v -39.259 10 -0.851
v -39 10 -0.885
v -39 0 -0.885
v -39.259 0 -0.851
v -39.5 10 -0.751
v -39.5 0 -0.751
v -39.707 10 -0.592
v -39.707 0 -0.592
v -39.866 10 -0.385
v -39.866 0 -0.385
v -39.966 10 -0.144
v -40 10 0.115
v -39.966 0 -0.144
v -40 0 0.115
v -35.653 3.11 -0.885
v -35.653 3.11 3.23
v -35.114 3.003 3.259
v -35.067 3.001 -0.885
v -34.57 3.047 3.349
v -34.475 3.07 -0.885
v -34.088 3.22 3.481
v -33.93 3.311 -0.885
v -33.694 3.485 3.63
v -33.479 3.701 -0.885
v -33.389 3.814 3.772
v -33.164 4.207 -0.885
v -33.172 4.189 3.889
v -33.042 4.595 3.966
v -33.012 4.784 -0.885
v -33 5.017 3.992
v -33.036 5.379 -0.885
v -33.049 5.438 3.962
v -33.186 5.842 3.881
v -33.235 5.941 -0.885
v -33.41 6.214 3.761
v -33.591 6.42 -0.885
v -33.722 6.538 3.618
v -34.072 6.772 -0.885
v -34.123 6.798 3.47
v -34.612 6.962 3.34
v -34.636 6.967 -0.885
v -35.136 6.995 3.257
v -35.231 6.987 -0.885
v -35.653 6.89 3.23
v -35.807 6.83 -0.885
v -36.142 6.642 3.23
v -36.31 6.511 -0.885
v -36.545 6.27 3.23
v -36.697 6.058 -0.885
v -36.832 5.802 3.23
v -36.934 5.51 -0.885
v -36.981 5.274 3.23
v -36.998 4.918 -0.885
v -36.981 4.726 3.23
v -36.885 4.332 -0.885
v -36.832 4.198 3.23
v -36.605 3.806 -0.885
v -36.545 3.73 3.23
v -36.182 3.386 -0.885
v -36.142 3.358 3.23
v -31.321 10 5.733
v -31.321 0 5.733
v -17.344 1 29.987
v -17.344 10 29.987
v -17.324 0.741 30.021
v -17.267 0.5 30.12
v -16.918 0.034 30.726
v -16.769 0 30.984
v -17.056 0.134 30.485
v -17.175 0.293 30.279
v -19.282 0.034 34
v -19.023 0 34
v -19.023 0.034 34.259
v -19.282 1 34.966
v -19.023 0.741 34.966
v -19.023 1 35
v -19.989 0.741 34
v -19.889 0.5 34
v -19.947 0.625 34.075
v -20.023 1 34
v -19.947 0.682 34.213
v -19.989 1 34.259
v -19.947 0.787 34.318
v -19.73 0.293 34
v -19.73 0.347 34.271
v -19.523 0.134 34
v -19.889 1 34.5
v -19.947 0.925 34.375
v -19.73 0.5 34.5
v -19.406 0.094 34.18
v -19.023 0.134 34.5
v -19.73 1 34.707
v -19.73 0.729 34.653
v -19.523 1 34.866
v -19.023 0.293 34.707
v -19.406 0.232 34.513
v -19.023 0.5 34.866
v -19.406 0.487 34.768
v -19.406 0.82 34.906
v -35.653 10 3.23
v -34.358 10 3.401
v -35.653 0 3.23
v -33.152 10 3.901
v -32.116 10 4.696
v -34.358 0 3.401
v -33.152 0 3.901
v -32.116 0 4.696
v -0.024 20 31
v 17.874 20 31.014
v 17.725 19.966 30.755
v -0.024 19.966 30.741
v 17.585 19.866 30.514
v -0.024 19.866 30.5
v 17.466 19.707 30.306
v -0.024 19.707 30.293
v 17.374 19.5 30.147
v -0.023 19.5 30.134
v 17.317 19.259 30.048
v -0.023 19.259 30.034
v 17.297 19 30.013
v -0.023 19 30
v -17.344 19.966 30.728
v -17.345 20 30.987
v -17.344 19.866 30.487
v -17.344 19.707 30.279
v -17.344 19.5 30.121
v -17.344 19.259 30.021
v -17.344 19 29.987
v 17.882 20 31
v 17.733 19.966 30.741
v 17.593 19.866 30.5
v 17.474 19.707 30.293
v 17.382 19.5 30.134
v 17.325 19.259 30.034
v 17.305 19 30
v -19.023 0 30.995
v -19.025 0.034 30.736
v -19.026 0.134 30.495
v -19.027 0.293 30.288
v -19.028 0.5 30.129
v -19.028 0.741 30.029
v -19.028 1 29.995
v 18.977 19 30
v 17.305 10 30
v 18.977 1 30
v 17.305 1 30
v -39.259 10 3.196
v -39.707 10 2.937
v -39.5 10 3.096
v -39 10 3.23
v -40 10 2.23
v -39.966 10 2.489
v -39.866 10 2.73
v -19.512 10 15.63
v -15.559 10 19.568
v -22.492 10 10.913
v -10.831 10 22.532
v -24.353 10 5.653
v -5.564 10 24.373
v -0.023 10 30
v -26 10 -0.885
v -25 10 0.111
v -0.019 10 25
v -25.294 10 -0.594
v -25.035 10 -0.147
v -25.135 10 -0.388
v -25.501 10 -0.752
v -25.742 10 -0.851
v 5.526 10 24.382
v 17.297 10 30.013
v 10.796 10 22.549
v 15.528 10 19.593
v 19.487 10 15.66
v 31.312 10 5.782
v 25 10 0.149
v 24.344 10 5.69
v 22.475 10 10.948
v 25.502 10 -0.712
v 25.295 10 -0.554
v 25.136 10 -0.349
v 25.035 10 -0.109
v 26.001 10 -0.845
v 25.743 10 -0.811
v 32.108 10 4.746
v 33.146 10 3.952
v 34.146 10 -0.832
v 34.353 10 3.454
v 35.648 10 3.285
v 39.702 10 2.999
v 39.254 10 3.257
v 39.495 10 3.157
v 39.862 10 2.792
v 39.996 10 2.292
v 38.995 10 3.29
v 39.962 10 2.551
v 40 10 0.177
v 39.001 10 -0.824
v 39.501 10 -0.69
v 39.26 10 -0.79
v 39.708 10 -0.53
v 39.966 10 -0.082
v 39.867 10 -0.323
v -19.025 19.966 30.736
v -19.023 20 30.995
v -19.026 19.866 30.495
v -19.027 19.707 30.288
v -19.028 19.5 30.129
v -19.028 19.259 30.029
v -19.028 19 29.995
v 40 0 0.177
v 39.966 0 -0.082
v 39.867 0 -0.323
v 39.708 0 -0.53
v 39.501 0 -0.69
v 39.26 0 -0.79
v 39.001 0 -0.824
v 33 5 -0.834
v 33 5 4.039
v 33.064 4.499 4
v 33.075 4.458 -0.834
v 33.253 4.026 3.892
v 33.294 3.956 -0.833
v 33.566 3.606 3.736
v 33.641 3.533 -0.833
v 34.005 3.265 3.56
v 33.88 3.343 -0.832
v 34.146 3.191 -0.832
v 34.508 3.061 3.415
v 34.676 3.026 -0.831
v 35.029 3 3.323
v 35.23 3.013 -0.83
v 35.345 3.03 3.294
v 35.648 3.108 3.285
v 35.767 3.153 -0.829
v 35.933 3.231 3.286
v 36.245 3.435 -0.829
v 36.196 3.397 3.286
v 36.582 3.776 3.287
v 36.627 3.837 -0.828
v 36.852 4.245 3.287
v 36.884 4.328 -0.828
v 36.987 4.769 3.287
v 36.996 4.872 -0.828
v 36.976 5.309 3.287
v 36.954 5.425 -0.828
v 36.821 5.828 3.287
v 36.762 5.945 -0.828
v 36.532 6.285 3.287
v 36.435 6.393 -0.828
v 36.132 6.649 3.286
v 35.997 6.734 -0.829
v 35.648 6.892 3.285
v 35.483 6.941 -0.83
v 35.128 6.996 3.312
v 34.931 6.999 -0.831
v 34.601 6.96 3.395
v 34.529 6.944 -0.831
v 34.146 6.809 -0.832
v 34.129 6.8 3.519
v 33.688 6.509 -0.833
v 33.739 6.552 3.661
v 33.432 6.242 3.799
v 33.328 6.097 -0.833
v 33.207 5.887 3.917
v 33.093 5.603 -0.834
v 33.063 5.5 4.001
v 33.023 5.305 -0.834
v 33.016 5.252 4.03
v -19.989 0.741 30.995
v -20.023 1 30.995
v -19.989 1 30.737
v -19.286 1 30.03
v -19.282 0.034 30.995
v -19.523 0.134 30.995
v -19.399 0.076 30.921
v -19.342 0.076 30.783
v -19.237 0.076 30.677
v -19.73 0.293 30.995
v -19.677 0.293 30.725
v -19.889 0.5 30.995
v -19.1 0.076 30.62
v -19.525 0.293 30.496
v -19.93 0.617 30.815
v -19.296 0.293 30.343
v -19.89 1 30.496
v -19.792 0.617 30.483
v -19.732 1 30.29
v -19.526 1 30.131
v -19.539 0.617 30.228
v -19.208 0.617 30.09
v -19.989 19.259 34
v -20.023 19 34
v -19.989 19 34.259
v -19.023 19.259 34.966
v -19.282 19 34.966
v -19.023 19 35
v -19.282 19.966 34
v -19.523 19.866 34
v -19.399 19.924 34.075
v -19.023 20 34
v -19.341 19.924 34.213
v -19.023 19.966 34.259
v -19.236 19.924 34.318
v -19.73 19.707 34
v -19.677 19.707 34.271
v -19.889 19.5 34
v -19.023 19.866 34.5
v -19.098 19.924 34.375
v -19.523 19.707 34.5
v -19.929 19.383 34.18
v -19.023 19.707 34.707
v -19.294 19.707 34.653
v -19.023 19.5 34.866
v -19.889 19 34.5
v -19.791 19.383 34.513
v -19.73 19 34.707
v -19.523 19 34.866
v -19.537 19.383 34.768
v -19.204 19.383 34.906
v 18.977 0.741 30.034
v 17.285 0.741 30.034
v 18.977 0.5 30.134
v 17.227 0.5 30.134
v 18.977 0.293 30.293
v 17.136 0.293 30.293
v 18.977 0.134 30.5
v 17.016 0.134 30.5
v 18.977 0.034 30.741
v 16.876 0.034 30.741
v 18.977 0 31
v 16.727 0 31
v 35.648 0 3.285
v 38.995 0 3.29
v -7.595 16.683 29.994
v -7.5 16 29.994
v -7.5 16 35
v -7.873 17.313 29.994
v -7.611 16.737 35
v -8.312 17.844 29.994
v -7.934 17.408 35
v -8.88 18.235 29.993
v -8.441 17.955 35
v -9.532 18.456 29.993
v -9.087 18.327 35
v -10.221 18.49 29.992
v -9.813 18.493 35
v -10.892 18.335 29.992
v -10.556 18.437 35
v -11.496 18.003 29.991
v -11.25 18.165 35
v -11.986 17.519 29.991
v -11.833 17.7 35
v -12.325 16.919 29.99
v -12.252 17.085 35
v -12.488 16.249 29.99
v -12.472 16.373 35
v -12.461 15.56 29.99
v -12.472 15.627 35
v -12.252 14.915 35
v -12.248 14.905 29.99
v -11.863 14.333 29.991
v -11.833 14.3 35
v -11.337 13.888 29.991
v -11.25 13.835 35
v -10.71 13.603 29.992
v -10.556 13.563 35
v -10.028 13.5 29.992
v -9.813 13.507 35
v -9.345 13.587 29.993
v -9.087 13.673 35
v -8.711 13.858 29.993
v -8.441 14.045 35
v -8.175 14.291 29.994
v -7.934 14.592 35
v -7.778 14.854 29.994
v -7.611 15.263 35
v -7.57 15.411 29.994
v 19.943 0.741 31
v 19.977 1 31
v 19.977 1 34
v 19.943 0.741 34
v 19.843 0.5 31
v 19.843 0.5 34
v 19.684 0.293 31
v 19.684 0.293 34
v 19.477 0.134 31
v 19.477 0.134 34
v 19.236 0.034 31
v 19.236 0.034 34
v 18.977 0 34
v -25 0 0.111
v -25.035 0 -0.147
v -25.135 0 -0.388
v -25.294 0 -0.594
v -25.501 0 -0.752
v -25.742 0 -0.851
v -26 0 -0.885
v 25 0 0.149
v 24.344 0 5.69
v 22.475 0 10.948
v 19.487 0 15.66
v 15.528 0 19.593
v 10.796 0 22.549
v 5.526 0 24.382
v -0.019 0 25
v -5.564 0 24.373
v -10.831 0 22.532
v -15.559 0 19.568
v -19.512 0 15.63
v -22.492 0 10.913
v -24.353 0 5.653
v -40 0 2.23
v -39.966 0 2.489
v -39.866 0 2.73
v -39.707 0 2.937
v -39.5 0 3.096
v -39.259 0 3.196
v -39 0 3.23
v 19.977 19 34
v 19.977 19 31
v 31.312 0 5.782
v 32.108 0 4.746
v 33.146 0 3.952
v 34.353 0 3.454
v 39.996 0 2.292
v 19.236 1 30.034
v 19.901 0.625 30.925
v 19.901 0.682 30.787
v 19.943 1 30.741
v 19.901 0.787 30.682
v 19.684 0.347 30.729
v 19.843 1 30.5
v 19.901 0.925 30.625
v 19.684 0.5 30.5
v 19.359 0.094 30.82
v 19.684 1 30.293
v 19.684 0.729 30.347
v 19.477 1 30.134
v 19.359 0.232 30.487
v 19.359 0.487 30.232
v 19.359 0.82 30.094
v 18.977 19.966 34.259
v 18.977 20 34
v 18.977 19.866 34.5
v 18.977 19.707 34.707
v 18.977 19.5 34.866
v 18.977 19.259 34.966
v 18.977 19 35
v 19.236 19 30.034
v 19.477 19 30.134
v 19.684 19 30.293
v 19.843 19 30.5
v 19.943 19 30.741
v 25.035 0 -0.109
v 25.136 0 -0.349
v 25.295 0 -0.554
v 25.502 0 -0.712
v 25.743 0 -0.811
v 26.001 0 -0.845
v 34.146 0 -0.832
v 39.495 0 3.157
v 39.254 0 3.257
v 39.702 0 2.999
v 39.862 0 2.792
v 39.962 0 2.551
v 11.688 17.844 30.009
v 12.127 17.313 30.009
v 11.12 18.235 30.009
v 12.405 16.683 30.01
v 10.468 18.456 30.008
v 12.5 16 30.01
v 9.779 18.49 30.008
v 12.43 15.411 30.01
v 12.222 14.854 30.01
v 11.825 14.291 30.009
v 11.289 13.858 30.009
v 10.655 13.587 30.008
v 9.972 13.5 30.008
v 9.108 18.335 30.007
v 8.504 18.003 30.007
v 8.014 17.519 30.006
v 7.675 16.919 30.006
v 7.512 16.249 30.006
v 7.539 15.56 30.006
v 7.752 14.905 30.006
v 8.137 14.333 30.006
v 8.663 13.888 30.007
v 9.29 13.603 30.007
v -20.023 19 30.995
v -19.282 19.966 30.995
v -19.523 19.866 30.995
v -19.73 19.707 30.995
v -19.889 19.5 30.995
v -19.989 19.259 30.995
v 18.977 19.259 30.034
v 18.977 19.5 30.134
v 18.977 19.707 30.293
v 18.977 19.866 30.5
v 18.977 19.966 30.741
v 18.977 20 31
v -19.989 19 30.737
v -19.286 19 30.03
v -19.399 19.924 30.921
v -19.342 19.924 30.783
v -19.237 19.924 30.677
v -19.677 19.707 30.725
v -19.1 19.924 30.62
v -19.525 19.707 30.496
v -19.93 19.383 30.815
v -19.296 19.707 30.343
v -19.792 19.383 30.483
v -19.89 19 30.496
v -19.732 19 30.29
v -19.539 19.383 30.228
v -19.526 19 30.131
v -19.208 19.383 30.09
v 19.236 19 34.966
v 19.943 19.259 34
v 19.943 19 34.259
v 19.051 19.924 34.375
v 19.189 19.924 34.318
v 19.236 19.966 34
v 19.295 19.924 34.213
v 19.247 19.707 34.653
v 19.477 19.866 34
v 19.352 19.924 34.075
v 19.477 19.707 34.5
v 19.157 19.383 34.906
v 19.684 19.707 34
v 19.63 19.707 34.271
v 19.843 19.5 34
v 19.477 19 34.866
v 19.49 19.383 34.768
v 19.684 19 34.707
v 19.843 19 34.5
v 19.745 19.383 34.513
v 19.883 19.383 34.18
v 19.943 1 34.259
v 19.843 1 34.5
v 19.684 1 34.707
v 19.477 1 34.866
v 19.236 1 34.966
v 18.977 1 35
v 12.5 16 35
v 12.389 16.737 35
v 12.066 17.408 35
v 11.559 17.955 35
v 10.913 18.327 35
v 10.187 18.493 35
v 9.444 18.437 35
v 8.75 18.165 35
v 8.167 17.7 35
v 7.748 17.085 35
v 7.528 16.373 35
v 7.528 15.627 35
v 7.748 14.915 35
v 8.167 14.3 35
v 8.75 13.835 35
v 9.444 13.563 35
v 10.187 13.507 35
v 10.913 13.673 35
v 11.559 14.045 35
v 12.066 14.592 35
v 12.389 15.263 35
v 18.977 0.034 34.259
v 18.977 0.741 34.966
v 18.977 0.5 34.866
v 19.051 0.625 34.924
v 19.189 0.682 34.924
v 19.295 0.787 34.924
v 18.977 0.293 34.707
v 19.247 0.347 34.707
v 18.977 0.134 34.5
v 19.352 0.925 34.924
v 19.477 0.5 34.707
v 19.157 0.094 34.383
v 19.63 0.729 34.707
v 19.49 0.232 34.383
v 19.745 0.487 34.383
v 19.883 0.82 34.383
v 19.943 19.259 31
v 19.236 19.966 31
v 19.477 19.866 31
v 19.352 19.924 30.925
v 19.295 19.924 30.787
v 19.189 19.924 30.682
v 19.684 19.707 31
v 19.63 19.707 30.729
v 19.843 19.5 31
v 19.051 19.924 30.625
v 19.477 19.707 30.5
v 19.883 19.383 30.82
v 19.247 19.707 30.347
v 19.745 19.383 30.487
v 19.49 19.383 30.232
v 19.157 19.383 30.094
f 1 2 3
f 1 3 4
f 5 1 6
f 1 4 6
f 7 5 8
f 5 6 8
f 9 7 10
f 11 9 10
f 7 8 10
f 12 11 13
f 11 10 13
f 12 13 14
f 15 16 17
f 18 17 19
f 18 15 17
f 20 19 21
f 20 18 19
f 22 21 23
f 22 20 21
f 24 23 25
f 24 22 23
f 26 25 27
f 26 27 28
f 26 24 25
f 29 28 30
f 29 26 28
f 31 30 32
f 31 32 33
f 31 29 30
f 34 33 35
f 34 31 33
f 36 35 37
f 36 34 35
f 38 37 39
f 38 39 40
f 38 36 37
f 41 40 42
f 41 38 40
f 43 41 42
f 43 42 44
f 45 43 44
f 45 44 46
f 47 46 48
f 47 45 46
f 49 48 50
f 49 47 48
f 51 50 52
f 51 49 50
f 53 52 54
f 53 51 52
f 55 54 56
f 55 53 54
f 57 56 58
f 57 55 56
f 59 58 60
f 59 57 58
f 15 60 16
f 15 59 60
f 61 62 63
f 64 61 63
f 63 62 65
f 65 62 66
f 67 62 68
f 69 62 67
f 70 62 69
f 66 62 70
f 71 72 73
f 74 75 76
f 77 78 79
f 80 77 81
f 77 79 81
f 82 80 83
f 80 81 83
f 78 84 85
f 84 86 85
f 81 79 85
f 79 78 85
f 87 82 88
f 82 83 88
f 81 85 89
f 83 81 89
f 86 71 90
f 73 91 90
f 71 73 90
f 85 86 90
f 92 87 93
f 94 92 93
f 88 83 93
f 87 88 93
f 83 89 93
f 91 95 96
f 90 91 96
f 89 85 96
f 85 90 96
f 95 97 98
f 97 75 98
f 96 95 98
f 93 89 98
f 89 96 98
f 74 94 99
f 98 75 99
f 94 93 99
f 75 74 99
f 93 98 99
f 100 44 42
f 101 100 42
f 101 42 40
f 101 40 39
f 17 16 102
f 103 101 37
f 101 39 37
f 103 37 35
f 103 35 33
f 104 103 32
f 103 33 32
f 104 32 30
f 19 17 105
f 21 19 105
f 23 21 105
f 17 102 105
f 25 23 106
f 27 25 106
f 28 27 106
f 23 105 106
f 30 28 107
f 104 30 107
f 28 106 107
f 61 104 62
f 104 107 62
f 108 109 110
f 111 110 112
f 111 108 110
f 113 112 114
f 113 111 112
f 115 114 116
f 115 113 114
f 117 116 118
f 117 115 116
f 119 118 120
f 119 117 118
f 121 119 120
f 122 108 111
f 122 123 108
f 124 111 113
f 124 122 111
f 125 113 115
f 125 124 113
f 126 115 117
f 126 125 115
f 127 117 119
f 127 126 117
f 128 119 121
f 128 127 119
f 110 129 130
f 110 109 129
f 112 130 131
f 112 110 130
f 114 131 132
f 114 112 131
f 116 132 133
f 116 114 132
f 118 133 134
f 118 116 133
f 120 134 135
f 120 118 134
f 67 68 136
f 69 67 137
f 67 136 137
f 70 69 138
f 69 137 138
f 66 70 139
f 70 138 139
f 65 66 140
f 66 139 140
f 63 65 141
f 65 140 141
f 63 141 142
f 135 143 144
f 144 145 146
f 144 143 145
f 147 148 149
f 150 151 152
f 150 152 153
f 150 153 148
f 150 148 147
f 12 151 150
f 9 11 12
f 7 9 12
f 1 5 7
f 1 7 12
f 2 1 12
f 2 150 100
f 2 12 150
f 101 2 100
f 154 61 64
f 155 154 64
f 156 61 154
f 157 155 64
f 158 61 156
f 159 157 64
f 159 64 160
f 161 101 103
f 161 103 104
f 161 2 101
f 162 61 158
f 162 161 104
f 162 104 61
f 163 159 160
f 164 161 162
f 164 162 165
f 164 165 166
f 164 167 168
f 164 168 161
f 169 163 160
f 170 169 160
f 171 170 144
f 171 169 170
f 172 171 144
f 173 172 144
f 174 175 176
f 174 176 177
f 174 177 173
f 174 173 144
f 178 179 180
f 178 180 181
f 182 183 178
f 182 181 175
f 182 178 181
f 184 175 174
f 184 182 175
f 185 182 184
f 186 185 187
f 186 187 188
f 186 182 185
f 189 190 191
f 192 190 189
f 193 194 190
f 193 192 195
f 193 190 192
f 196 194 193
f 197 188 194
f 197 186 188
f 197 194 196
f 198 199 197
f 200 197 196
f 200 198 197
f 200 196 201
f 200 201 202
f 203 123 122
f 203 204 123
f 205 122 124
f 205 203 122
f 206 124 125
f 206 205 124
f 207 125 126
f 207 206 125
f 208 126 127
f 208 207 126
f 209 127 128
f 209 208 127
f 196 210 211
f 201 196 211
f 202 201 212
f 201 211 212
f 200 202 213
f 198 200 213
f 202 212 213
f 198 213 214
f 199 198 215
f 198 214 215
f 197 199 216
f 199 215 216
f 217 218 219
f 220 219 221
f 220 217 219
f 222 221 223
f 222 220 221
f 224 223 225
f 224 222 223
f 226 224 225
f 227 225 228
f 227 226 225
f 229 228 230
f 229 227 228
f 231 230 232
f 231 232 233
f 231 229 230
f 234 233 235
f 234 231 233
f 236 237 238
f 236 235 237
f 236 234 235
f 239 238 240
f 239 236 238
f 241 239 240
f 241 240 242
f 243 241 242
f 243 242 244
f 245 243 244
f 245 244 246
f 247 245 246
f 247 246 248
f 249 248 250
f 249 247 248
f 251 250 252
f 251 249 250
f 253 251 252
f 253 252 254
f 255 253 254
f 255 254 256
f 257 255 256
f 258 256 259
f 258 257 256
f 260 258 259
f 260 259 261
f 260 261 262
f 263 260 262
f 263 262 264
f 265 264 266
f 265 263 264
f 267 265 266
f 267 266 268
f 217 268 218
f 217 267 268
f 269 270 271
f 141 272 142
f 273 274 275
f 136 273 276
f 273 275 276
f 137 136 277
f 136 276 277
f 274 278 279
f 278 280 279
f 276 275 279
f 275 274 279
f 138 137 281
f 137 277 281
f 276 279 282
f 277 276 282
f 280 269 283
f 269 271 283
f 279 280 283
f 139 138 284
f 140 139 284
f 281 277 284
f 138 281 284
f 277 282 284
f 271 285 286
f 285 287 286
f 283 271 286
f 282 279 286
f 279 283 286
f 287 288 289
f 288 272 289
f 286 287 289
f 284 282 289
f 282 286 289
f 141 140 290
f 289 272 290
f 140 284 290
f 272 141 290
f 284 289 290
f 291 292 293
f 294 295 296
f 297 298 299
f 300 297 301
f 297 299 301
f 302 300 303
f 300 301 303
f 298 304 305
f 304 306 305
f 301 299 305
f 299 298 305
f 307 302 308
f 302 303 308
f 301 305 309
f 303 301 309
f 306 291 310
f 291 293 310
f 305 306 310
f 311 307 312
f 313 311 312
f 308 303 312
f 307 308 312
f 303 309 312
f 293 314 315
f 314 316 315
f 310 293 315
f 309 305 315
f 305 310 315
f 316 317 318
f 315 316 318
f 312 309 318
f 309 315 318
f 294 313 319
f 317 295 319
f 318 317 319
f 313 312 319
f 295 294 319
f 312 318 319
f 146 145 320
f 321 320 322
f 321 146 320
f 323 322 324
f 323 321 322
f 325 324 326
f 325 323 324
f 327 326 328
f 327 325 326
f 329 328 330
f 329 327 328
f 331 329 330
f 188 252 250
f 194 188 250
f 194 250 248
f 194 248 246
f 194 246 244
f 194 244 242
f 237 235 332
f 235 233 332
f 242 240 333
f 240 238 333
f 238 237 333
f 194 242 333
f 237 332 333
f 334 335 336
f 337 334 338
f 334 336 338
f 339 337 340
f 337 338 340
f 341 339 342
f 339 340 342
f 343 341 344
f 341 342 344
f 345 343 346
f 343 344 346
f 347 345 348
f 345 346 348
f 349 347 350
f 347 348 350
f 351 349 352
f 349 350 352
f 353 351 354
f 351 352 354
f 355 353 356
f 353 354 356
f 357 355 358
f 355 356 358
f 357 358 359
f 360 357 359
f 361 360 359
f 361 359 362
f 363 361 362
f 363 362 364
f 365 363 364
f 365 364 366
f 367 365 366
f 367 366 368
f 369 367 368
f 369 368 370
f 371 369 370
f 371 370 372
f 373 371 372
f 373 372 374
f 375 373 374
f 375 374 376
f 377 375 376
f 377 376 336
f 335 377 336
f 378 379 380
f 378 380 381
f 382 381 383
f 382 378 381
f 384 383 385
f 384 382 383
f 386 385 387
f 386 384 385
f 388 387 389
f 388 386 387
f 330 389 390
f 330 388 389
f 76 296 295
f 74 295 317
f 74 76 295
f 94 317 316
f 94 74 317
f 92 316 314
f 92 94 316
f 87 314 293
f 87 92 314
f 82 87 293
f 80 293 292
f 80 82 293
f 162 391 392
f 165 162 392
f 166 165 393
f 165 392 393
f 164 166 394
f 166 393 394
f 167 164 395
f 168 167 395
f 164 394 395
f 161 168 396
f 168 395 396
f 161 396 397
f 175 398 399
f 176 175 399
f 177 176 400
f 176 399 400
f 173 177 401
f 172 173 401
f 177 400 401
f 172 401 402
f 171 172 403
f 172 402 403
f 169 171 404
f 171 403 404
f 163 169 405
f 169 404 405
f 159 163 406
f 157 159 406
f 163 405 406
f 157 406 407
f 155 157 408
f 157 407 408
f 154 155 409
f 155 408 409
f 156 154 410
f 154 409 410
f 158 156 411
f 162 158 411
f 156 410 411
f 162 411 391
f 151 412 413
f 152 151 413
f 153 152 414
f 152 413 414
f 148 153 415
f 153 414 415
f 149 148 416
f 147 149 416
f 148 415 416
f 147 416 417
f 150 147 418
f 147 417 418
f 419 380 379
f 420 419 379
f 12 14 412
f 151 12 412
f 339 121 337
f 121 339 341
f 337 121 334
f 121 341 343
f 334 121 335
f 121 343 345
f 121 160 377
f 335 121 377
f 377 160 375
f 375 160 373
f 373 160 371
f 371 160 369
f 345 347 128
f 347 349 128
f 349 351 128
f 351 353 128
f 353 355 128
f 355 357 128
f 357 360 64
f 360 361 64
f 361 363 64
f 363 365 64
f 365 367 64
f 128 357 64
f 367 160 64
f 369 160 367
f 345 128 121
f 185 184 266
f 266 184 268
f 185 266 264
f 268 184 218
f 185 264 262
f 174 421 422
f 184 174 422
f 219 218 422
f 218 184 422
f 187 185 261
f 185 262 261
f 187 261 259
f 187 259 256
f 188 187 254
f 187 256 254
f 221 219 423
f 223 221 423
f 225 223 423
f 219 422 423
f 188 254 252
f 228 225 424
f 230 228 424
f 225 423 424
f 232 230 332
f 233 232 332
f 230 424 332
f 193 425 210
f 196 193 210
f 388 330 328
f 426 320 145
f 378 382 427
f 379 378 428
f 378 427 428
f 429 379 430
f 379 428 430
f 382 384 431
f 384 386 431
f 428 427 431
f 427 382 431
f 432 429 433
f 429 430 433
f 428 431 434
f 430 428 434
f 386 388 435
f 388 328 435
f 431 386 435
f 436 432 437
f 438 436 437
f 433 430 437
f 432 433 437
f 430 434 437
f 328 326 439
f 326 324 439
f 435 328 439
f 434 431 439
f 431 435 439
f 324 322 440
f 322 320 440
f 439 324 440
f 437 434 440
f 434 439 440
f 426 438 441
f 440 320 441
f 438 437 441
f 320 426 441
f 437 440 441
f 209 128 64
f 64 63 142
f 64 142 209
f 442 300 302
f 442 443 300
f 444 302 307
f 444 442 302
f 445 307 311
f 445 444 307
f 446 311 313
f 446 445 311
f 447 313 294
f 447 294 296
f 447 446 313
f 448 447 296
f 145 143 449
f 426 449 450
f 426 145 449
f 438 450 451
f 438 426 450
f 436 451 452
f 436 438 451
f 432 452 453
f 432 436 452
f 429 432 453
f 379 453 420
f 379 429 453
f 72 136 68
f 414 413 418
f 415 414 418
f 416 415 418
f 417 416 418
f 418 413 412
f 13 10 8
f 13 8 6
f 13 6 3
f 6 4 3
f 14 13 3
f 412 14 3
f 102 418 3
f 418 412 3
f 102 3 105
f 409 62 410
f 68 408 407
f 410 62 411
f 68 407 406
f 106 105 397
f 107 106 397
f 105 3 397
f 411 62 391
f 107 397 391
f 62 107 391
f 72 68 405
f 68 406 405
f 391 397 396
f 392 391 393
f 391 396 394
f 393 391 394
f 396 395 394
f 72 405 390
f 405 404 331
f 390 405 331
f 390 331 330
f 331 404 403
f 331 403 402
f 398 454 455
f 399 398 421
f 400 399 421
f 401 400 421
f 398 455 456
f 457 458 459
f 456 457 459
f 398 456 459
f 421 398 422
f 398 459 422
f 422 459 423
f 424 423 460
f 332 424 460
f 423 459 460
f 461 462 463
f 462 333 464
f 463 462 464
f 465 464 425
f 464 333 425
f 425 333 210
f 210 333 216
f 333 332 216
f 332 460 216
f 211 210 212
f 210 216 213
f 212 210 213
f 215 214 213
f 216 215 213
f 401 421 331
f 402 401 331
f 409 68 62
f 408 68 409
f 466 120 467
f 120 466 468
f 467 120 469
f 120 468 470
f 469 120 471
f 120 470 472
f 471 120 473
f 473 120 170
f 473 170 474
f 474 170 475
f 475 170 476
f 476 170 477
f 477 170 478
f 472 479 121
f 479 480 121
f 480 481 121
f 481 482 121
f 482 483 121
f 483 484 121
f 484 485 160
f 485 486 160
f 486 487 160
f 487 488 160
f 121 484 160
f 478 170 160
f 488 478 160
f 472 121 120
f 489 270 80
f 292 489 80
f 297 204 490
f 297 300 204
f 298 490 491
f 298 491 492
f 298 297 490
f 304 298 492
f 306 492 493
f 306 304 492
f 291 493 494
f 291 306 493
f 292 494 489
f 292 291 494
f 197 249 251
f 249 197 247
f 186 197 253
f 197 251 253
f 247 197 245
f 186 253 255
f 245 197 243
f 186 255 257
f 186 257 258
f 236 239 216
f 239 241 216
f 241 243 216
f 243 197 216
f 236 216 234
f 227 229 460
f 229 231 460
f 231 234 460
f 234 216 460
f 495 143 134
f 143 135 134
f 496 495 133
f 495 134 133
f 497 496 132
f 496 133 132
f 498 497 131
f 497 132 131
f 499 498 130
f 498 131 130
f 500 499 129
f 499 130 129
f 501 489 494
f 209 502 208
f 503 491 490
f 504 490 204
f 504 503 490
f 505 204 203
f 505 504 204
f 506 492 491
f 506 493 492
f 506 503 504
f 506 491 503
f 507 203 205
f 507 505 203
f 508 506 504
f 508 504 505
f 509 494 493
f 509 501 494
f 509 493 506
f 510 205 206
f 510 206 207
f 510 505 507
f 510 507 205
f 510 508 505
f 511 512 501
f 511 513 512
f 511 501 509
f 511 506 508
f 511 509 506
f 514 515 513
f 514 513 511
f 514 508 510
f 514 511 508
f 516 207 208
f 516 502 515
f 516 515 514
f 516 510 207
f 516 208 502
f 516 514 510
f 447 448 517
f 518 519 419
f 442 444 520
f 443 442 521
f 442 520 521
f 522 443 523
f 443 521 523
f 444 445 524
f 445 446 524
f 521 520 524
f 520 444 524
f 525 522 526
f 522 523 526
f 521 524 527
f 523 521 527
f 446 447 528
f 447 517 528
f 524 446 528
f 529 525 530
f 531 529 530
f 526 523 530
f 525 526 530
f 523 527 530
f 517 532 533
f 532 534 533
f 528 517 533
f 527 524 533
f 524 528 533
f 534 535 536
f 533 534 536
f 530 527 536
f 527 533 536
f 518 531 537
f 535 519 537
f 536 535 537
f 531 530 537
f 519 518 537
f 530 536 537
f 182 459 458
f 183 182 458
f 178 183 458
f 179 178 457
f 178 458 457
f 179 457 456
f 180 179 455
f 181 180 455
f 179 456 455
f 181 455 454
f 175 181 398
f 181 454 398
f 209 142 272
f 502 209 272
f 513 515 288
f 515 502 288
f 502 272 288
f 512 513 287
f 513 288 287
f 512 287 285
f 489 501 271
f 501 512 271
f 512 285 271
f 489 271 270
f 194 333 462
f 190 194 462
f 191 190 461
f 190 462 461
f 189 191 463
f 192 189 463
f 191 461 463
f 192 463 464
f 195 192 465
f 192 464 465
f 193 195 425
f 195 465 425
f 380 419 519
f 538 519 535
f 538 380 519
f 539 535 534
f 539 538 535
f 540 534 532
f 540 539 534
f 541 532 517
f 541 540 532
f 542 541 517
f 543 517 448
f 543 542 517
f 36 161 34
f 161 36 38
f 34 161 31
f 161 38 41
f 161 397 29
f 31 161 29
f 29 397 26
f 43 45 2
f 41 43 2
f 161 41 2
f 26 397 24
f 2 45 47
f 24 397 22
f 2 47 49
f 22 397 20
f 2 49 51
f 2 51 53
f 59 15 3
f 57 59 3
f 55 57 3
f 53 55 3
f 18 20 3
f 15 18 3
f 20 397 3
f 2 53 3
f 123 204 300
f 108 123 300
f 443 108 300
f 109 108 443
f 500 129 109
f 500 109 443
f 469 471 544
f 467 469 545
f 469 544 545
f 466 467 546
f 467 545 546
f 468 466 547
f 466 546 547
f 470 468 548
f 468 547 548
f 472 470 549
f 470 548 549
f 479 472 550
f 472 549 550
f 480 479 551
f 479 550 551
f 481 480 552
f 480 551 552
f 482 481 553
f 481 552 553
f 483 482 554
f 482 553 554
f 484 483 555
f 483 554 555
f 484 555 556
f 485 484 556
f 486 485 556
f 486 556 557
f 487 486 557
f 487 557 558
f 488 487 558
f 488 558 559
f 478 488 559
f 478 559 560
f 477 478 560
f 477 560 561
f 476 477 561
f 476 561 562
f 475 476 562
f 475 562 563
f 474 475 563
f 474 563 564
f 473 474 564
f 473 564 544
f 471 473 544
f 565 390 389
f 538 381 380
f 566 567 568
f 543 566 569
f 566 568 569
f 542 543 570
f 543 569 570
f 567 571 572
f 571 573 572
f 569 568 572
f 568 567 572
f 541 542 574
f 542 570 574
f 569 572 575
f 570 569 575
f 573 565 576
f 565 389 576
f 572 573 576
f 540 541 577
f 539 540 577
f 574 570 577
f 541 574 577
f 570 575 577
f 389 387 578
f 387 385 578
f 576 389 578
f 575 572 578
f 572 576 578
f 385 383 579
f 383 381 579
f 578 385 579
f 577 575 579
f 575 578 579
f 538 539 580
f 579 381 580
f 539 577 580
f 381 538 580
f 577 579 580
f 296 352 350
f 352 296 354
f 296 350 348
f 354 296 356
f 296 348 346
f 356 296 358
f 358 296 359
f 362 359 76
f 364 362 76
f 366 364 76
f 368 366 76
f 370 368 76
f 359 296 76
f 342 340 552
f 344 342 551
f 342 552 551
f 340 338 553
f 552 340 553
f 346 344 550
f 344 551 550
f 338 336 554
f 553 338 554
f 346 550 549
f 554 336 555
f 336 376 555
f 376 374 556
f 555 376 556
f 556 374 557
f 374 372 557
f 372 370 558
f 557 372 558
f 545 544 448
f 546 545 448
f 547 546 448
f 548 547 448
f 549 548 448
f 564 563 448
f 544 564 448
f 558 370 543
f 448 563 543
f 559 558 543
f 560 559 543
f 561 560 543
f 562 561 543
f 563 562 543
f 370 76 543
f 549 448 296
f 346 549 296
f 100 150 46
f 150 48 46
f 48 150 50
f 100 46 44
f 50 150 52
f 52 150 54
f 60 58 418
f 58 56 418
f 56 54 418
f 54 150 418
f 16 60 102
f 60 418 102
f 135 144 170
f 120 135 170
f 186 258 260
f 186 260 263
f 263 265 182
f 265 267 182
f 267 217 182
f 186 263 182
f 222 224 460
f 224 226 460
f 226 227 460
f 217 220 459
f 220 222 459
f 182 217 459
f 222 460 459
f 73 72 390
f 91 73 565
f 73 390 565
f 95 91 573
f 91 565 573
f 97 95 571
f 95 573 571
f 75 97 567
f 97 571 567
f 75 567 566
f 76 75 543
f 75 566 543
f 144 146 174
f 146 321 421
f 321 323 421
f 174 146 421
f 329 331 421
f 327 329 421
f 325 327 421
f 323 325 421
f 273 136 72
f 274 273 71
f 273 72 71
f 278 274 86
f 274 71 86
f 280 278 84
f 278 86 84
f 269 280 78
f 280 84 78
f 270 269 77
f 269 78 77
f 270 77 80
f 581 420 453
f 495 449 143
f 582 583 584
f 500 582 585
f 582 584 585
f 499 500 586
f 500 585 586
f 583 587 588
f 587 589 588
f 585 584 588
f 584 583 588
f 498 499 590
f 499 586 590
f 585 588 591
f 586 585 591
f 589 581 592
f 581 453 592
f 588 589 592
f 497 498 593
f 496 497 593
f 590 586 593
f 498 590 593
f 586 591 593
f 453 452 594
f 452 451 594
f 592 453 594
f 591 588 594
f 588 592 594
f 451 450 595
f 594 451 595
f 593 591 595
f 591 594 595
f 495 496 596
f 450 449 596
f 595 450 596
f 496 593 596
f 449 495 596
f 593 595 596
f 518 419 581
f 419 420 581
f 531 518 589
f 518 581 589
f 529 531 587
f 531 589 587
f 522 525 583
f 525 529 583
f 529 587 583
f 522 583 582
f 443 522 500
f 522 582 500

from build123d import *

# Parameters (mm, degrees)
EXTRUDE_2_DEPTH          = 10
CUT_EXTRUDE_1_DEPTH      = 55.083263276
CUT_EXTRUDE_1_DEPTH_BACK = 55.083263276
SKETCH_2_R               = 2
EXTRUDE_4_DEPTH          = 20
SKETCH_4_R               = 2.5
CUT_EXTRUDE_2_DEPTH      = 20
FILLET_1_R               = 1


with BuildPart() as part:
    # 草图1 → 凸台-拉伸2 (new body)
    with BuildSketch(Plane(origin=(0, 0, 0), x_dir=(1, 0, 0), z_dir=(0, 1, 0))):
        with BuildLine():
            Line((19.976699203, -29.999990951), (17.304982924, -29.999990951))
            Line((17.304982924, -29.999990951), (31.312388487, -5.781912211))
            ThreePointArc((31.312388487, -5.781912211), (33.145618934, -3.952237958), (35.648339397, -3.28528067))
            Line((35.648339397, -3.28528067), (38.994935663, -3.290479232))
            ThreePointArc((38.994935663, -3.290479232), (39.702496567, -2.998684777), (39.996487843, -2.292033825))
            Line((39.996487843, -2.292033825), (39.999773177, -0.177085839))
            ThreePointArc((39.999773177, -0.177085839), (39.707978722, 0.530475065), (39.00132777, 0.82446634))
            Line((39.00132777, 0.82446634), (34.146000565, 0.832008547))
            Line((34.146000565, 0.832008547), (26.001089345, 0.844660753))
            ThreePointArc((26.001089345, 0.844660753), (25.295095717, 0.554425262), (24.999553807, -0.1493635))
            ThreePointArc((24.999553807, -0.1493635), (-0.019417331, -24.999992459), (-24.999755664, -0.110529363))
            ThreePointArc((-24.999755664, -0.110529363), (-25.294203962, 0.593717641), (-25.999745891, 0.885049463))
            Line((-25.999745891, 0.885049463), (-39, 0.885049463))
            ThreePointArc((-39, 0.885049463), (-39.707106781, 0.592156244), (-40, -0.114950537))
            Line((-40, -0.114950537), (-40, -2.229901074))
            ThreePointArc((-40, -2.229901074), (-39.707106781, -2.937007856), (-39, -3.229901074))
            Line((-39, -3.229901074), (-35.653399696, -3.229901074))
            ThreePointArc((-35.653399696, -3.229901074), (-33.151718295, -3.900745249), (-31.32133225, -5.733265009))
            Line((-31.32133225, -5.733265009), (-17.343803649, -29.98653823))
            Line((-17.343803649, -29.98653823), (-20.023300797, -29.999990951))
            Line((-20.023300797, -29.999990951), (-20.023300797, -34.999990951))
            Line((-20.023300797, -34.999990951), (19.976699203, -34.999990951))
            Line((19.976699203, -34.999990951), (19.976699203, -29.999990951))
        make_face()
    extrude(amount=EXTRUDE_2_DEPTH)

    # 草图2 → 切除-拉伸1 (cut, two sides: drawn at the far end of the back side and taken through both)
    with BuildSketch(Plane.XY.offset(-CUT_EXTRUDE_1_DEPTH_BACK)):
        with Locations((-35, 5)):
            Circle(SKETCH_2_R)
        with Locations((35, 5)):
            Circle(SKETCH_2_R)
    extrude(amount=CUT_EXTRUDE_1_DEPTH + CUT_EXTRUDE_1_DEPTH_BACK, mode=Mode.SUBTRACT)

    # 草图1<6> → 凸台-拉伸4 (add)
    with BuildSketch(Plane(origin=(0, 0, 0), x_dir=(1, 0, 0), z_dir=(0, 1, 0))):
        Polygon((17.304982924, -29.999990951), (17.297202054, -30.013443673), (-0.023300797, -29.999990951), (-17.343803649, -29.98653823), (-20.023300797, -29.999990951), (-20.023300797, -34.999990951), (19.976699203, -34.999990951), (19.976699203, -29.999990951), align=None)
    extrude(amount=EXTRUDE_4_DEPTH)

    # 草图4 → 切除-拉伸2 (cut)
    with BuildSketch(Plane.XY.offset(34.999990951)):
        with Locations((10, 16)):
            Circle(SKETCH_4_R)
        with Locations((-10, 16)):
            Circle(SKETCH_4_R)
    extrude(amount=-CUT_EXTRUDE_2_DEPTH, mode=Mode.SUBTRACT)

    # 圆角1
    fillet_1_edges = [part.edges().sort_by_distance(p)[0] for p in [
        (-20.023300797, 10, 29.999990951),
        (-20.023300797, 10, 34.999990951),
        (-20.023300797, 0, 32.499990951),
        (19.976699203, 10, 34.999990951),
        (19.976699203, 10, 29.999990951),
        (19.976699203, 0, 32.499990951),
        (17.301092489, 20, 30.006717312),
        (18.640841063, 20, 29.999990951),
        (19.976699203, 20, 32.499990951),
        (-0.023300797, 20, 34.999990951),
        (-20.023300797, 20, 32.499990951),
        (-18.683552223, 20, 29.99326459),
        (-0.023300797, 20, 29.999990951),
        (-18.683552223, 0, 29.99326459),
        (18.640841063, 0, 29.999990951),
        (-0.023300797, 0, 34.999990951),
    ]]
    fillet(fillet_1_edges, radius=FILLET_1_R)


solid = part.part
